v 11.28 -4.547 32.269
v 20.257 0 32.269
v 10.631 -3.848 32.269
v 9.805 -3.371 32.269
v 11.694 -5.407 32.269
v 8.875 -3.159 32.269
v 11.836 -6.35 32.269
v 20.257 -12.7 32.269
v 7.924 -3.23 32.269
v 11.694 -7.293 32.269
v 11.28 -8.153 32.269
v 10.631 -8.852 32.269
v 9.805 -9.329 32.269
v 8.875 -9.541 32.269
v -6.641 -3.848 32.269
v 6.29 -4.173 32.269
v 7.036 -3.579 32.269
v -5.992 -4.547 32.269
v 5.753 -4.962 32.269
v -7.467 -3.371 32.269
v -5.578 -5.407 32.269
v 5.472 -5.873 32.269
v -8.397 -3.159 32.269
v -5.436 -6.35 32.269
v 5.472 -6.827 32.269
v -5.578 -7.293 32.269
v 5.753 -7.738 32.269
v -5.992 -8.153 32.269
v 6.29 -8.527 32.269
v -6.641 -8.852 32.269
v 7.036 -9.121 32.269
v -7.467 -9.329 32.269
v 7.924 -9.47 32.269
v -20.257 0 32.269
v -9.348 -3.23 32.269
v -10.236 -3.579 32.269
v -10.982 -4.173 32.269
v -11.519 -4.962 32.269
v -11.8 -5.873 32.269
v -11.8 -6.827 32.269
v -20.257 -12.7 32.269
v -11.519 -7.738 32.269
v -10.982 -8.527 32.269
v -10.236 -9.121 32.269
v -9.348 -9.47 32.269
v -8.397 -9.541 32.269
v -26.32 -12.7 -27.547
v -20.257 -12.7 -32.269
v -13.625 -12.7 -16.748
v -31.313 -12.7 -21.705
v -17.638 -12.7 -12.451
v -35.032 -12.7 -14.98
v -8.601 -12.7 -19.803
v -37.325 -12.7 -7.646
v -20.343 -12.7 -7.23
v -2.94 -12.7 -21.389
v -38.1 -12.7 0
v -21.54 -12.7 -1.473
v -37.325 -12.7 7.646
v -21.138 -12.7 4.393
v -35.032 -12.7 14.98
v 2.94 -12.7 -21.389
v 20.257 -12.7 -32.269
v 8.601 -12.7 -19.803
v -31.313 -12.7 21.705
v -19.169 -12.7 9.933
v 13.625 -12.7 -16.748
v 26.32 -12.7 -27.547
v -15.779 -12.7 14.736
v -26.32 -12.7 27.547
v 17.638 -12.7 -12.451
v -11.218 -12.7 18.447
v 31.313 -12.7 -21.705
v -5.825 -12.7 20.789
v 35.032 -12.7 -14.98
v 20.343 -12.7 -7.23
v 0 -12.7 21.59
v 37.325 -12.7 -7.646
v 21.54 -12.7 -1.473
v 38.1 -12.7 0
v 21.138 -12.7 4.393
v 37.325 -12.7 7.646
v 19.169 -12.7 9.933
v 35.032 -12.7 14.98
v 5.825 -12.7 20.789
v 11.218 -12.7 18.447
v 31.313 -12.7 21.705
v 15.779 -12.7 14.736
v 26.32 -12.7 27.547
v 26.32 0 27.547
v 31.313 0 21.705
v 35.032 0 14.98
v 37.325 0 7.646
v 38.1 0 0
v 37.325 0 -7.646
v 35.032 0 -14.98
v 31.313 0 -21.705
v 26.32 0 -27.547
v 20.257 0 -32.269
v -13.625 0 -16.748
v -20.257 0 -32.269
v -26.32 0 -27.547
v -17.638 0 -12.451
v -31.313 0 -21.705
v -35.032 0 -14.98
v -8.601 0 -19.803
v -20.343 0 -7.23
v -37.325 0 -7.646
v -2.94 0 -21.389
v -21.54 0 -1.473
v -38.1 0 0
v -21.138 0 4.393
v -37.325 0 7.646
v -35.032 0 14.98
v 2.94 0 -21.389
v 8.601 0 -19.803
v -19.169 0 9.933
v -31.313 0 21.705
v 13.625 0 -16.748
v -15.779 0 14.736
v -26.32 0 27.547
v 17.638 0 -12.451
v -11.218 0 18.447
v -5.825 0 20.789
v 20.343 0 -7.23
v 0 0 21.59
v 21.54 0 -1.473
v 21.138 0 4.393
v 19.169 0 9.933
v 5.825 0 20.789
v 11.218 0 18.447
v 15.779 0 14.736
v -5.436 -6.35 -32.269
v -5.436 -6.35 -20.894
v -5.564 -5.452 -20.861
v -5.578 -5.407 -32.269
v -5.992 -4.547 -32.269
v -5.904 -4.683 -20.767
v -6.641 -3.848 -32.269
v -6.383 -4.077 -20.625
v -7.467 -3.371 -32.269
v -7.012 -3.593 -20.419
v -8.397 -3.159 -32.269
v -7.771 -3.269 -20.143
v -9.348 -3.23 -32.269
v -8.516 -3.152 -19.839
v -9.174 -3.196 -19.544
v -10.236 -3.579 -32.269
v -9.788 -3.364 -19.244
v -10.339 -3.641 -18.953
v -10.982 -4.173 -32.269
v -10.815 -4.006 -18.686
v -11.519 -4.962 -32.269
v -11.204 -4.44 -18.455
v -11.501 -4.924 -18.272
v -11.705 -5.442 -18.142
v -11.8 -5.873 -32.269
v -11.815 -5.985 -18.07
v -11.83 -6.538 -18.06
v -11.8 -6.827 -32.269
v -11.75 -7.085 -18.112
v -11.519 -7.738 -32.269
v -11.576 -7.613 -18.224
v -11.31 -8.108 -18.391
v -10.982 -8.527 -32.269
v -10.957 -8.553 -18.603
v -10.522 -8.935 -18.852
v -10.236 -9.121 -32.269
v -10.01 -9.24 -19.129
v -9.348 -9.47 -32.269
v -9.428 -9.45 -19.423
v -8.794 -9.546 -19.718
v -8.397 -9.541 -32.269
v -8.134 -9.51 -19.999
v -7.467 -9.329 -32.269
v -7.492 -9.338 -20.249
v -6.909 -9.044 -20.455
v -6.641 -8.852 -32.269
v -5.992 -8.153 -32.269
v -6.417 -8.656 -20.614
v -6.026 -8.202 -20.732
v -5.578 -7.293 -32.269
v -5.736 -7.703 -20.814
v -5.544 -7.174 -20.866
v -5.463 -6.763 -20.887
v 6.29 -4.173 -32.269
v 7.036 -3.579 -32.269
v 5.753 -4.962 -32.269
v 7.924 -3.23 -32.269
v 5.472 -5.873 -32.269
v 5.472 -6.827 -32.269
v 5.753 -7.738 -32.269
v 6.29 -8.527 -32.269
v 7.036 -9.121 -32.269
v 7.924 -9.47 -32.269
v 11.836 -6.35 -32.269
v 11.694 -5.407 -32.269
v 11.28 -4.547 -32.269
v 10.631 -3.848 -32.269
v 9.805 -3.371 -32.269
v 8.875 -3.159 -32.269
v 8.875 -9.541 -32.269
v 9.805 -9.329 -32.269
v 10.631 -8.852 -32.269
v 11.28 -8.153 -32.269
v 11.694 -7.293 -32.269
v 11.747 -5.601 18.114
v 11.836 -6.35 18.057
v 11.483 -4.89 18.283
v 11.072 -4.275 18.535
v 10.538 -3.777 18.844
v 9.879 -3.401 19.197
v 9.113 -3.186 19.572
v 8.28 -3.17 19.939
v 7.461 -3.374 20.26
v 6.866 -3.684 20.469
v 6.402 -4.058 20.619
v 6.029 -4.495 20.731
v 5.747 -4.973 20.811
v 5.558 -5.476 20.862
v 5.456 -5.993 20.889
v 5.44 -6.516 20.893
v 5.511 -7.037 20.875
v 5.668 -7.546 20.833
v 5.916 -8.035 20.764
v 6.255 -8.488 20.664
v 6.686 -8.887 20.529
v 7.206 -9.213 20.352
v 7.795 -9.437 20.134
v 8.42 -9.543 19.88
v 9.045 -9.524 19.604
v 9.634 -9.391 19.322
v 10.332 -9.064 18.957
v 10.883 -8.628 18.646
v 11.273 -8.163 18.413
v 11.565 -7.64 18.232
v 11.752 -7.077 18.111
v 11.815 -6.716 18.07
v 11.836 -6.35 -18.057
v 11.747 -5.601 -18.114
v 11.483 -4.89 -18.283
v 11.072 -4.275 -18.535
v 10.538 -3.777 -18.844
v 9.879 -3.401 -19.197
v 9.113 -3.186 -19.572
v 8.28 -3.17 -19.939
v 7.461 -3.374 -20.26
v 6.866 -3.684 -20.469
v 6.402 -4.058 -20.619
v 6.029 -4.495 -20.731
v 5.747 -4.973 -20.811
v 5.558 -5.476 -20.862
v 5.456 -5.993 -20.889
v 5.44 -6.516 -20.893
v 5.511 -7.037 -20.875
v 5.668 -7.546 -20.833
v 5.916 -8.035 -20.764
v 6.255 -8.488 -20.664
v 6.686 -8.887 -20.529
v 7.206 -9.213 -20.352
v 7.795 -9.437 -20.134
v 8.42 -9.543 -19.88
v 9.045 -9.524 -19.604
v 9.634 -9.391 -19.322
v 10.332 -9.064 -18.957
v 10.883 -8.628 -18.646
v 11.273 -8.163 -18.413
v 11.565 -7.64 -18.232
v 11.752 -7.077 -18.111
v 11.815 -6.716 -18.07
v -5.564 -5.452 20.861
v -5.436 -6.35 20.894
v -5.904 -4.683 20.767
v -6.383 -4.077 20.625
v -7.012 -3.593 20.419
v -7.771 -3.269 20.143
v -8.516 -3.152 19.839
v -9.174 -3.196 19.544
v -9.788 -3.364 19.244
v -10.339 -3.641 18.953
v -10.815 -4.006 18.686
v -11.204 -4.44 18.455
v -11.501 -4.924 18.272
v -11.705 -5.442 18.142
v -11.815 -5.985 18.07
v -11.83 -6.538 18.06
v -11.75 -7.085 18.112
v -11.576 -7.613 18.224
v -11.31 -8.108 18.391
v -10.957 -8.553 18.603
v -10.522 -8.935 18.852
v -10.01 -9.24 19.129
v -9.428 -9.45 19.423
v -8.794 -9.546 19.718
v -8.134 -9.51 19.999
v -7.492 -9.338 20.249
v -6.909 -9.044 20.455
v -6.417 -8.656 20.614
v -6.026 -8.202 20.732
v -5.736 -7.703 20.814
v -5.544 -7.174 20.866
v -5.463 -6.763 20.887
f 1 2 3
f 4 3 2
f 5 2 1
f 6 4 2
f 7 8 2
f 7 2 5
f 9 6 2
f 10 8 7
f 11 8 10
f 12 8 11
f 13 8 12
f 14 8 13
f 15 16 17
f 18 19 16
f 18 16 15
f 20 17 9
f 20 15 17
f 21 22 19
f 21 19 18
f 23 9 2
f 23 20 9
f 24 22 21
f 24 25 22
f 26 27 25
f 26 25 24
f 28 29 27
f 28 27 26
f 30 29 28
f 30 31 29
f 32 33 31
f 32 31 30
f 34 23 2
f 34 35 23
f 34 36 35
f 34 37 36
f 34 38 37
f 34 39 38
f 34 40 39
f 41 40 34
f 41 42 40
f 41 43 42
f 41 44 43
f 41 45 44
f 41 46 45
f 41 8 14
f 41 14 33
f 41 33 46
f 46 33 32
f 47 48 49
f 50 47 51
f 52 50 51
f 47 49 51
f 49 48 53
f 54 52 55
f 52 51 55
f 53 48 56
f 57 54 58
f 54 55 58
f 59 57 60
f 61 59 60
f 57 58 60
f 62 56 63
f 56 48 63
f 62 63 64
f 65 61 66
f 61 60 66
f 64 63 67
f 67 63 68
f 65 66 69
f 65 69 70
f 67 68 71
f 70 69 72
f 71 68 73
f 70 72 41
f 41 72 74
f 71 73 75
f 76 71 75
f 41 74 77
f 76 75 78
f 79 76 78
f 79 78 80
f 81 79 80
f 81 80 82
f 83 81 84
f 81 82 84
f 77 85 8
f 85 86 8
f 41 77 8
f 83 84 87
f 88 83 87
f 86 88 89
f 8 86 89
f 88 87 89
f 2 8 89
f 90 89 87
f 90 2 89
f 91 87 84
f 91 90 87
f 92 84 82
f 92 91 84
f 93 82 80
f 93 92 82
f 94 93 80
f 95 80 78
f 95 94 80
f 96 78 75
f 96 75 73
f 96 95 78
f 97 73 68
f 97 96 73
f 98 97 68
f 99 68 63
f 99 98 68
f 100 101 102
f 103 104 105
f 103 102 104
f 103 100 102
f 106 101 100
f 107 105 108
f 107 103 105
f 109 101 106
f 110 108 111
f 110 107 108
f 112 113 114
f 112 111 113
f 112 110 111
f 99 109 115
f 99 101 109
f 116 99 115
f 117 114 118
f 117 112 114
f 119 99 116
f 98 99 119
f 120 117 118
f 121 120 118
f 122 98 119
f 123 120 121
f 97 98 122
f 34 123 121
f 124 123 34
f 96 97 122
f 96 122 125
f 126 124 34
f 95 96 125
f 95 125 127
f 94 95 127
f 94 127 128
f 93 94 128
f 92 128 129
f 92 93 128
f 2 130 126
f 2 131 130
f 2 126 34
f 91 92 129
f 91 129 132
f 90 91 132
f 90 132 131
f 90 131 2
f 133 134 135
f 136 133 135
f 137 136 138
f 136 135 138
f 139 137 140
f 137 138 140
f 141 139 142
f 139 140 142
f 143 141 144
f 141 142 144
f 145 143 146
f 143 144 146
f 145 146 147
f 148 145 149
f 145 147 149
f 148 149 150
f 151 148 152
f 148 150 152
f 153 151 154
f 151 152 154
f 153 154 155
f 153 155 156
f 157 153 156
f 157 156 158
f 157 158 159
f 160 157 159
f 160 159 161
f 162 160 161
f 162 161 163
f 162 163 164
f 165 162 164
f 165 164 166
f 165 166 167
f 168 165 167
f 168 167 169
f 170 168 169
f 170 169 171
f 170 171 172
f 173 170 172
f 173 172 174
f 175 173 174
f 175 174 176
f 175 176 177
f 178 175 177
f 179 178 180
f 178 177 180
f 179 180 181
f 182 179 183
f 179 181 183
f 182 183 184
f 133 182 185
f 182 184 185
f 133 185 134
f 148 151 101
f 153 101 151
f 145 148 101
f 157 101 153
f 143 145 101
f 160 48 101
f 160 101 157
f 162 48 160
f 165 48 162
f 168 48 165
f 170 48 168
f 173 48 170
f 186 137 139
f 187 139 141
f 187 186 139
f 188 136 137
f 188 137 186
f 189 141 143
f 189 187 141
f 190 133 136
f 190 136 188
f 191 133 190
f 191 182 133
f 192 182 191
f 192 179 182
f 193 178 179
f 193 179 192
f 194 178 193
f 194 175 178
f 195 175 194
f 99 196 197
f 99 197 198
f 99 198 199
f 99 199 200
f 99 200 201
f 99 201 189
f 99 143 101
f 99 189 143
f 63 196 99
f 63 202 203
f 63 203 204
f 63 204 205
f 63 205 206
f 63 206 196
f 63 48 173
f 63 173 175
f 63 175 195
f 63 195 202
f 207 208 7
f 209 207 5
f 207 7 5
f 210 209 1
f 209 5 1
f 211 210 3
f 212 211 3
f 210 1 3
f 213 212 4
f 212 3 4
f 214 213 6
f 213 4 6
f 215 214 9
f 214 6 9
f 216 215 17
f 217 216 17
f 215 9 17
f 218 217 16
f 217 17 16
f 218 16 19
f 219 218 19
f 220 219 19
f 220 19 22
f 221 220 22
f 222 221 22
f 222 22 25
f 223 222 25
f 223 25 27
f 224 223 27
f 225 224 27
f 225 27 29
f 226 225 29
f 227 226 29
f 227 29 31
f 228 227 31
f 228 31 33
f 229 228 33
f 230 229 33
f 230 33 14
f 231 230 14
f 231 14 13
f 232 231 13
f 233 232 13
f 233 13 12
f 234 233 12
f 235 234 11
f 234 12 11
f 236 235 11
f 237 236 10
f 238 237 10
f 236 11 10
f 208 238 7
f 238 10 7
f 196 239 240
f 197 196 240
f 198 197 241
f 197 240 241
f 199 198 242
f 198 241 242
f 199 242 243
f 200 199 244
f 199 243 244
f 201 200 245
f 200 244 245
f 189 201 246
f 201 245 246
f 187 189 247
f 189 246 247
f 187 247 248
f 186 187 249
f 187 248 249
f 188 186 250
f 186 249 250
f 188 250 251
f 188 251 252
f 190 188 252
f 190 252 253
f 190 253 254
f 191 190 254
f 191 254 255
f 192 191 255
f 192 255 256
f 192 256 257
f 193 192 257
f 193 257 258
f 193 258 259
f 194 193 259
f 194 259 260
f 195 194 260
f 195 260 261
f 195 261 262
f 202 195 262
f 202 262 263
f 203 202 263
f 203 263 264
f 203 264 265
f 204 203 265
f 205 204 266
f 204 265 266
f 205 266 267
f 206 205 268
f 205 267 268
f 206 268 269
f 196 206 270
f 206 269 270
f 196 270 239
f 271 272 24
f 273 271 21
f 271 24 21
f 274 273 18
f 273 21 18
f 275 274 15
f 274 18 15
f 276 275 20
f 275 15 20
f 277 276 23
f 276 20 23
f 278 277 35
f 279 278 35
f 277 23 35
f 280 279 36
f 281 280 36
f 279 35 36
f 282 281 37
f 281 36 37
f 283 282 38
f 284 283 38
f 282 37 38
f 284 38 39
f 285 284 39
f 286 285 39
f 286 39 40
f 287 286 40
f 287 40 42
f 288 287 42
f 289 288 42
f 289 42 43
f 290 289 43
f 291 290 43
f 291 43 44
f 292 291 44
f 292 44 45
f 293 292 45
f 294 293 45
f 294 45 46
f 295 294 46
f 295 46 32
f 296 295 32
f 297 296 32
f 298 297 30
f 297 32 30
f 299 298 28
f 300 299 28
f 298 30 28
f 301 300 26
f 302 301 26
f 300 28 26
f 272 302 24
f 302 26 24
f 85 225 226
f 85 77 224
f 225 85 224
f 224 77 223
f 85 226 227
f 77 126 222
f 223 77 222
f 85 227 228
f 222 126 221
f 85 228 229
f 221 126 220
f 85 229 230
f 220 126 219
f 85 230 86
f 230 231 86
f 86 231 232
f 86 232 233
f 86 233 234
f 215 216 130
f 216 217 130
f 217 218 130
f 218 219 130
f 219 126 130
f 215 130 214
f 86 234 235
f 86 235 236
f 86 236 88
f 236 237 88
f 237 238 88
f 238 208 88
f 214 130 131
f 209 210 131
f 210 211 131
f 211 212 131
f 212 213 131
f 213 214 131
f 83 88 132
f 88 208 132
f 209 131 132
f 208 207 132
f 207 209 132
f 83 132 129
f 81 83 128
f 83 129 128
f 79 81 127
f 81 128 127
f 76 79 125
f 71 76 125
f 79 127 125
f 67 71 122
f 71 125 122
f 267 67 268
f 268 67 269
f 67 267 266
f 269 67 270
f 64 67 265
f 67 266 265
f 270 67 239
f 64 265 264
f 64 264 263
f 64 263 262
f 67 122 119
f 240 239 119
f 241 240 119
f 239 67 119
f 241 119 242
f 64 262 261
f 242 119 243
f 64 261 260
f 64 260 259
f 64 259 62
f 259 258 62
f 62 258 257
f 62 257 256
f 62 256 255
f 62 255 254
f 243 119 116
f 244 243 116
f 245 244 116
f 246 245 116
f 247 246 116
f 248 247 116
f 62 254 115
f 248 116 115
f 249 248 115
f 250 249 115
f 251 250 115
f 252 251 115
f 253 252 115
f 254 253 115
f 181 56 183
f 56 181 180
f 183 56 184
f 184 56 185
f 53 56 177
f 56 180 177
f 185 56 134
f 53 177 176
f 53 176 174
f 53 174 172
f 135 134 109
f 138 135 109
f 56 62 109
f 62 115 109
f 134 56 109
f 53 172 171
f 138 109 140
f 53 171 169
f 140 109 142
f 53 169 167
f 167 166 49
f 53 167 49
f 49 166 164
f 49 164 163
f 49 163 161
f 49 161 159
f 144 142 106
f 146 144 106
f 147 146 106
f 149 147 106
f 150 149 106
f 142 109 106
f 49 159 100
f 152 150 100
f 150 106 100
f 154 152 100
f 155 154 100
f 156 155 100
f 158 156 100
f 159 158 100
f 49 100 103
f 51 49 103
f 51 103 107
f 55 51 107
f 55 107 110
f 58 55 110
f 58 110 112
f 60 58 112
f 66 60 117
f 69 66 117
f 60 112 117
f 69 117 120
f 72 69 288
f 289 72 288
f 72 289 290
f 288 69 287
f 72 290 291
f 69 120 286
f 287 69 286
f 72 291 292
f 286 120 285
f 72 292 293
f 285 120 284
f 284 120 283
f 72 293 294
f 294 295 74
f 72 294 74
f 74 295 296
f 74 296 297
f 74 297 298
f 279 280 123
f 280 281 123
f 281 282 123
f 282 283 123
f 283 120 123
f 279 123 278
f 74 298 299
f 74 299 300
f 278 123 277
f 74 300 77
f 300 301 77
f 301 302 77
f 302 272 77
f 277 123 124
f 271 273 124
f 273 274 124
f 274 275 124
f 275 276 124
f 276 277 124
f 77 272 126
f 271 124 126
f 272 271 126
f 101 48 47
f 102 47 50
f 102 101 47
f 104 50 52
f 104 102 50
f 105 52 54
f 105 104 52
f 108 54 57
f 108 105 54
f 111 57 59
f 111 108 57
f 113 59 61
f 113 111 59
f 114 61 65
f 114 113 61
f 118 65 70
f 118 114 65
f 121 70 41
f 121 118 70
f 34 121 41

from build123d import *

# Parameters (mm, degrees)
SKETCH1_R            = 38.1
EXTRUDE2_DEPTH       = 12.7
SKETCH5_R            = 21.59
EXTRUDE3_DEPTH       = 56.358016583
EXTRUDE4_DEPTH       = 56.358016583
EXTRUDE4_DEPTH_BACK  = 56.358016583
EXTRUDE5_DEPTH       = 56.358016583
EXTRUDE5_DEPTH_BACK  = 56.358016583
M6_CLEARANCE_HOLE1_D = 6.4


with BuildPart() as part:
    # Sketch1 → Extrude2 (new body)
    with BuildSketch(Plane(origin=(0, 0, 0), x_dir=(1, 0, 0), z_dir=(0, 1, 0))):
        with Locations(Location((0, 0, 0), (0, 0, 270))):
            Circle(SKETCH1_R)
    extrude(amount=-EXTRUDE2_DEPTH)

    # Sketch5 → Extrude3 (cut, through all)
    with BuildSketch(Plane(origin=(0, 0, 0), x_dir=(1, 0, 0), z_dir=(0, 1, 0))):
        with Locations(Location((0, 0, 0), (0, 0, 270))):
            Circle(SKETCH5_R)
    extrude(amount=-EXTRUDE3_DEPTH, mode=Mode.SUBTRACT)

    # Sketch6 → Extrude4 (cut, two sides: drawn at the far end of the back side and taken through both)
    with BuildSketch(Plane(origin=(0, 0, 0), x_dir=(1, 0, 0), z_dir=(0, 1, 0)).offset(-EXTRUDE4_DEPTH_BACK)):
        Polygon((-213.093459479, 32.268567529), (-20.257086404, 32.268567529), (20.257086404, 32.268567529), (213.093459479, 32.268567529), (213.093459479, 417.941313679), (-213.093459479, 417.941313679), align=None)
    extrude(amount=EXTRUDE4_DEPTH + EXTRUDE4_DEPTH_BACK, mode=Mode.SUBTRACT)

    # Sketch7 → Extrude5 (cut, two sides: drawn at the far end of the back side and taken through both)
    with BuildSketch(Plane(origin=(0, 0, 0), x_dir=(1, 0, 0), z_dir=(0, 1, 0)).offset(-EXTRUDE5_DEPTH_BACK)):
        Polygon((-204.275376653, -32.268567529), (-20.257086404, -32.268567529), (20.257086404, -32.268567529), (204.275376653, -32.268567529), (204.275376653, -400.305148026), (-204.275376653, -400.305148026), align=None)
    extrude(amount=EXTRUDE5_DEPTH + EXTRUDE5_DEPTH_BACK, mode=Mode.SUBTRACT)

    # M6 Clearance Hole1 (through all)
    with Locations(Plane(origin=(8.636, -6.35, -32.268567529), x_dir=(-1, 0, 0), z_dir=(0, 0, -1))):
        with Locations((0, 0), (17.272, 0)):
            Hole(M6_CLEARANCE_HOLE1_D / 2)


solid = part.part
